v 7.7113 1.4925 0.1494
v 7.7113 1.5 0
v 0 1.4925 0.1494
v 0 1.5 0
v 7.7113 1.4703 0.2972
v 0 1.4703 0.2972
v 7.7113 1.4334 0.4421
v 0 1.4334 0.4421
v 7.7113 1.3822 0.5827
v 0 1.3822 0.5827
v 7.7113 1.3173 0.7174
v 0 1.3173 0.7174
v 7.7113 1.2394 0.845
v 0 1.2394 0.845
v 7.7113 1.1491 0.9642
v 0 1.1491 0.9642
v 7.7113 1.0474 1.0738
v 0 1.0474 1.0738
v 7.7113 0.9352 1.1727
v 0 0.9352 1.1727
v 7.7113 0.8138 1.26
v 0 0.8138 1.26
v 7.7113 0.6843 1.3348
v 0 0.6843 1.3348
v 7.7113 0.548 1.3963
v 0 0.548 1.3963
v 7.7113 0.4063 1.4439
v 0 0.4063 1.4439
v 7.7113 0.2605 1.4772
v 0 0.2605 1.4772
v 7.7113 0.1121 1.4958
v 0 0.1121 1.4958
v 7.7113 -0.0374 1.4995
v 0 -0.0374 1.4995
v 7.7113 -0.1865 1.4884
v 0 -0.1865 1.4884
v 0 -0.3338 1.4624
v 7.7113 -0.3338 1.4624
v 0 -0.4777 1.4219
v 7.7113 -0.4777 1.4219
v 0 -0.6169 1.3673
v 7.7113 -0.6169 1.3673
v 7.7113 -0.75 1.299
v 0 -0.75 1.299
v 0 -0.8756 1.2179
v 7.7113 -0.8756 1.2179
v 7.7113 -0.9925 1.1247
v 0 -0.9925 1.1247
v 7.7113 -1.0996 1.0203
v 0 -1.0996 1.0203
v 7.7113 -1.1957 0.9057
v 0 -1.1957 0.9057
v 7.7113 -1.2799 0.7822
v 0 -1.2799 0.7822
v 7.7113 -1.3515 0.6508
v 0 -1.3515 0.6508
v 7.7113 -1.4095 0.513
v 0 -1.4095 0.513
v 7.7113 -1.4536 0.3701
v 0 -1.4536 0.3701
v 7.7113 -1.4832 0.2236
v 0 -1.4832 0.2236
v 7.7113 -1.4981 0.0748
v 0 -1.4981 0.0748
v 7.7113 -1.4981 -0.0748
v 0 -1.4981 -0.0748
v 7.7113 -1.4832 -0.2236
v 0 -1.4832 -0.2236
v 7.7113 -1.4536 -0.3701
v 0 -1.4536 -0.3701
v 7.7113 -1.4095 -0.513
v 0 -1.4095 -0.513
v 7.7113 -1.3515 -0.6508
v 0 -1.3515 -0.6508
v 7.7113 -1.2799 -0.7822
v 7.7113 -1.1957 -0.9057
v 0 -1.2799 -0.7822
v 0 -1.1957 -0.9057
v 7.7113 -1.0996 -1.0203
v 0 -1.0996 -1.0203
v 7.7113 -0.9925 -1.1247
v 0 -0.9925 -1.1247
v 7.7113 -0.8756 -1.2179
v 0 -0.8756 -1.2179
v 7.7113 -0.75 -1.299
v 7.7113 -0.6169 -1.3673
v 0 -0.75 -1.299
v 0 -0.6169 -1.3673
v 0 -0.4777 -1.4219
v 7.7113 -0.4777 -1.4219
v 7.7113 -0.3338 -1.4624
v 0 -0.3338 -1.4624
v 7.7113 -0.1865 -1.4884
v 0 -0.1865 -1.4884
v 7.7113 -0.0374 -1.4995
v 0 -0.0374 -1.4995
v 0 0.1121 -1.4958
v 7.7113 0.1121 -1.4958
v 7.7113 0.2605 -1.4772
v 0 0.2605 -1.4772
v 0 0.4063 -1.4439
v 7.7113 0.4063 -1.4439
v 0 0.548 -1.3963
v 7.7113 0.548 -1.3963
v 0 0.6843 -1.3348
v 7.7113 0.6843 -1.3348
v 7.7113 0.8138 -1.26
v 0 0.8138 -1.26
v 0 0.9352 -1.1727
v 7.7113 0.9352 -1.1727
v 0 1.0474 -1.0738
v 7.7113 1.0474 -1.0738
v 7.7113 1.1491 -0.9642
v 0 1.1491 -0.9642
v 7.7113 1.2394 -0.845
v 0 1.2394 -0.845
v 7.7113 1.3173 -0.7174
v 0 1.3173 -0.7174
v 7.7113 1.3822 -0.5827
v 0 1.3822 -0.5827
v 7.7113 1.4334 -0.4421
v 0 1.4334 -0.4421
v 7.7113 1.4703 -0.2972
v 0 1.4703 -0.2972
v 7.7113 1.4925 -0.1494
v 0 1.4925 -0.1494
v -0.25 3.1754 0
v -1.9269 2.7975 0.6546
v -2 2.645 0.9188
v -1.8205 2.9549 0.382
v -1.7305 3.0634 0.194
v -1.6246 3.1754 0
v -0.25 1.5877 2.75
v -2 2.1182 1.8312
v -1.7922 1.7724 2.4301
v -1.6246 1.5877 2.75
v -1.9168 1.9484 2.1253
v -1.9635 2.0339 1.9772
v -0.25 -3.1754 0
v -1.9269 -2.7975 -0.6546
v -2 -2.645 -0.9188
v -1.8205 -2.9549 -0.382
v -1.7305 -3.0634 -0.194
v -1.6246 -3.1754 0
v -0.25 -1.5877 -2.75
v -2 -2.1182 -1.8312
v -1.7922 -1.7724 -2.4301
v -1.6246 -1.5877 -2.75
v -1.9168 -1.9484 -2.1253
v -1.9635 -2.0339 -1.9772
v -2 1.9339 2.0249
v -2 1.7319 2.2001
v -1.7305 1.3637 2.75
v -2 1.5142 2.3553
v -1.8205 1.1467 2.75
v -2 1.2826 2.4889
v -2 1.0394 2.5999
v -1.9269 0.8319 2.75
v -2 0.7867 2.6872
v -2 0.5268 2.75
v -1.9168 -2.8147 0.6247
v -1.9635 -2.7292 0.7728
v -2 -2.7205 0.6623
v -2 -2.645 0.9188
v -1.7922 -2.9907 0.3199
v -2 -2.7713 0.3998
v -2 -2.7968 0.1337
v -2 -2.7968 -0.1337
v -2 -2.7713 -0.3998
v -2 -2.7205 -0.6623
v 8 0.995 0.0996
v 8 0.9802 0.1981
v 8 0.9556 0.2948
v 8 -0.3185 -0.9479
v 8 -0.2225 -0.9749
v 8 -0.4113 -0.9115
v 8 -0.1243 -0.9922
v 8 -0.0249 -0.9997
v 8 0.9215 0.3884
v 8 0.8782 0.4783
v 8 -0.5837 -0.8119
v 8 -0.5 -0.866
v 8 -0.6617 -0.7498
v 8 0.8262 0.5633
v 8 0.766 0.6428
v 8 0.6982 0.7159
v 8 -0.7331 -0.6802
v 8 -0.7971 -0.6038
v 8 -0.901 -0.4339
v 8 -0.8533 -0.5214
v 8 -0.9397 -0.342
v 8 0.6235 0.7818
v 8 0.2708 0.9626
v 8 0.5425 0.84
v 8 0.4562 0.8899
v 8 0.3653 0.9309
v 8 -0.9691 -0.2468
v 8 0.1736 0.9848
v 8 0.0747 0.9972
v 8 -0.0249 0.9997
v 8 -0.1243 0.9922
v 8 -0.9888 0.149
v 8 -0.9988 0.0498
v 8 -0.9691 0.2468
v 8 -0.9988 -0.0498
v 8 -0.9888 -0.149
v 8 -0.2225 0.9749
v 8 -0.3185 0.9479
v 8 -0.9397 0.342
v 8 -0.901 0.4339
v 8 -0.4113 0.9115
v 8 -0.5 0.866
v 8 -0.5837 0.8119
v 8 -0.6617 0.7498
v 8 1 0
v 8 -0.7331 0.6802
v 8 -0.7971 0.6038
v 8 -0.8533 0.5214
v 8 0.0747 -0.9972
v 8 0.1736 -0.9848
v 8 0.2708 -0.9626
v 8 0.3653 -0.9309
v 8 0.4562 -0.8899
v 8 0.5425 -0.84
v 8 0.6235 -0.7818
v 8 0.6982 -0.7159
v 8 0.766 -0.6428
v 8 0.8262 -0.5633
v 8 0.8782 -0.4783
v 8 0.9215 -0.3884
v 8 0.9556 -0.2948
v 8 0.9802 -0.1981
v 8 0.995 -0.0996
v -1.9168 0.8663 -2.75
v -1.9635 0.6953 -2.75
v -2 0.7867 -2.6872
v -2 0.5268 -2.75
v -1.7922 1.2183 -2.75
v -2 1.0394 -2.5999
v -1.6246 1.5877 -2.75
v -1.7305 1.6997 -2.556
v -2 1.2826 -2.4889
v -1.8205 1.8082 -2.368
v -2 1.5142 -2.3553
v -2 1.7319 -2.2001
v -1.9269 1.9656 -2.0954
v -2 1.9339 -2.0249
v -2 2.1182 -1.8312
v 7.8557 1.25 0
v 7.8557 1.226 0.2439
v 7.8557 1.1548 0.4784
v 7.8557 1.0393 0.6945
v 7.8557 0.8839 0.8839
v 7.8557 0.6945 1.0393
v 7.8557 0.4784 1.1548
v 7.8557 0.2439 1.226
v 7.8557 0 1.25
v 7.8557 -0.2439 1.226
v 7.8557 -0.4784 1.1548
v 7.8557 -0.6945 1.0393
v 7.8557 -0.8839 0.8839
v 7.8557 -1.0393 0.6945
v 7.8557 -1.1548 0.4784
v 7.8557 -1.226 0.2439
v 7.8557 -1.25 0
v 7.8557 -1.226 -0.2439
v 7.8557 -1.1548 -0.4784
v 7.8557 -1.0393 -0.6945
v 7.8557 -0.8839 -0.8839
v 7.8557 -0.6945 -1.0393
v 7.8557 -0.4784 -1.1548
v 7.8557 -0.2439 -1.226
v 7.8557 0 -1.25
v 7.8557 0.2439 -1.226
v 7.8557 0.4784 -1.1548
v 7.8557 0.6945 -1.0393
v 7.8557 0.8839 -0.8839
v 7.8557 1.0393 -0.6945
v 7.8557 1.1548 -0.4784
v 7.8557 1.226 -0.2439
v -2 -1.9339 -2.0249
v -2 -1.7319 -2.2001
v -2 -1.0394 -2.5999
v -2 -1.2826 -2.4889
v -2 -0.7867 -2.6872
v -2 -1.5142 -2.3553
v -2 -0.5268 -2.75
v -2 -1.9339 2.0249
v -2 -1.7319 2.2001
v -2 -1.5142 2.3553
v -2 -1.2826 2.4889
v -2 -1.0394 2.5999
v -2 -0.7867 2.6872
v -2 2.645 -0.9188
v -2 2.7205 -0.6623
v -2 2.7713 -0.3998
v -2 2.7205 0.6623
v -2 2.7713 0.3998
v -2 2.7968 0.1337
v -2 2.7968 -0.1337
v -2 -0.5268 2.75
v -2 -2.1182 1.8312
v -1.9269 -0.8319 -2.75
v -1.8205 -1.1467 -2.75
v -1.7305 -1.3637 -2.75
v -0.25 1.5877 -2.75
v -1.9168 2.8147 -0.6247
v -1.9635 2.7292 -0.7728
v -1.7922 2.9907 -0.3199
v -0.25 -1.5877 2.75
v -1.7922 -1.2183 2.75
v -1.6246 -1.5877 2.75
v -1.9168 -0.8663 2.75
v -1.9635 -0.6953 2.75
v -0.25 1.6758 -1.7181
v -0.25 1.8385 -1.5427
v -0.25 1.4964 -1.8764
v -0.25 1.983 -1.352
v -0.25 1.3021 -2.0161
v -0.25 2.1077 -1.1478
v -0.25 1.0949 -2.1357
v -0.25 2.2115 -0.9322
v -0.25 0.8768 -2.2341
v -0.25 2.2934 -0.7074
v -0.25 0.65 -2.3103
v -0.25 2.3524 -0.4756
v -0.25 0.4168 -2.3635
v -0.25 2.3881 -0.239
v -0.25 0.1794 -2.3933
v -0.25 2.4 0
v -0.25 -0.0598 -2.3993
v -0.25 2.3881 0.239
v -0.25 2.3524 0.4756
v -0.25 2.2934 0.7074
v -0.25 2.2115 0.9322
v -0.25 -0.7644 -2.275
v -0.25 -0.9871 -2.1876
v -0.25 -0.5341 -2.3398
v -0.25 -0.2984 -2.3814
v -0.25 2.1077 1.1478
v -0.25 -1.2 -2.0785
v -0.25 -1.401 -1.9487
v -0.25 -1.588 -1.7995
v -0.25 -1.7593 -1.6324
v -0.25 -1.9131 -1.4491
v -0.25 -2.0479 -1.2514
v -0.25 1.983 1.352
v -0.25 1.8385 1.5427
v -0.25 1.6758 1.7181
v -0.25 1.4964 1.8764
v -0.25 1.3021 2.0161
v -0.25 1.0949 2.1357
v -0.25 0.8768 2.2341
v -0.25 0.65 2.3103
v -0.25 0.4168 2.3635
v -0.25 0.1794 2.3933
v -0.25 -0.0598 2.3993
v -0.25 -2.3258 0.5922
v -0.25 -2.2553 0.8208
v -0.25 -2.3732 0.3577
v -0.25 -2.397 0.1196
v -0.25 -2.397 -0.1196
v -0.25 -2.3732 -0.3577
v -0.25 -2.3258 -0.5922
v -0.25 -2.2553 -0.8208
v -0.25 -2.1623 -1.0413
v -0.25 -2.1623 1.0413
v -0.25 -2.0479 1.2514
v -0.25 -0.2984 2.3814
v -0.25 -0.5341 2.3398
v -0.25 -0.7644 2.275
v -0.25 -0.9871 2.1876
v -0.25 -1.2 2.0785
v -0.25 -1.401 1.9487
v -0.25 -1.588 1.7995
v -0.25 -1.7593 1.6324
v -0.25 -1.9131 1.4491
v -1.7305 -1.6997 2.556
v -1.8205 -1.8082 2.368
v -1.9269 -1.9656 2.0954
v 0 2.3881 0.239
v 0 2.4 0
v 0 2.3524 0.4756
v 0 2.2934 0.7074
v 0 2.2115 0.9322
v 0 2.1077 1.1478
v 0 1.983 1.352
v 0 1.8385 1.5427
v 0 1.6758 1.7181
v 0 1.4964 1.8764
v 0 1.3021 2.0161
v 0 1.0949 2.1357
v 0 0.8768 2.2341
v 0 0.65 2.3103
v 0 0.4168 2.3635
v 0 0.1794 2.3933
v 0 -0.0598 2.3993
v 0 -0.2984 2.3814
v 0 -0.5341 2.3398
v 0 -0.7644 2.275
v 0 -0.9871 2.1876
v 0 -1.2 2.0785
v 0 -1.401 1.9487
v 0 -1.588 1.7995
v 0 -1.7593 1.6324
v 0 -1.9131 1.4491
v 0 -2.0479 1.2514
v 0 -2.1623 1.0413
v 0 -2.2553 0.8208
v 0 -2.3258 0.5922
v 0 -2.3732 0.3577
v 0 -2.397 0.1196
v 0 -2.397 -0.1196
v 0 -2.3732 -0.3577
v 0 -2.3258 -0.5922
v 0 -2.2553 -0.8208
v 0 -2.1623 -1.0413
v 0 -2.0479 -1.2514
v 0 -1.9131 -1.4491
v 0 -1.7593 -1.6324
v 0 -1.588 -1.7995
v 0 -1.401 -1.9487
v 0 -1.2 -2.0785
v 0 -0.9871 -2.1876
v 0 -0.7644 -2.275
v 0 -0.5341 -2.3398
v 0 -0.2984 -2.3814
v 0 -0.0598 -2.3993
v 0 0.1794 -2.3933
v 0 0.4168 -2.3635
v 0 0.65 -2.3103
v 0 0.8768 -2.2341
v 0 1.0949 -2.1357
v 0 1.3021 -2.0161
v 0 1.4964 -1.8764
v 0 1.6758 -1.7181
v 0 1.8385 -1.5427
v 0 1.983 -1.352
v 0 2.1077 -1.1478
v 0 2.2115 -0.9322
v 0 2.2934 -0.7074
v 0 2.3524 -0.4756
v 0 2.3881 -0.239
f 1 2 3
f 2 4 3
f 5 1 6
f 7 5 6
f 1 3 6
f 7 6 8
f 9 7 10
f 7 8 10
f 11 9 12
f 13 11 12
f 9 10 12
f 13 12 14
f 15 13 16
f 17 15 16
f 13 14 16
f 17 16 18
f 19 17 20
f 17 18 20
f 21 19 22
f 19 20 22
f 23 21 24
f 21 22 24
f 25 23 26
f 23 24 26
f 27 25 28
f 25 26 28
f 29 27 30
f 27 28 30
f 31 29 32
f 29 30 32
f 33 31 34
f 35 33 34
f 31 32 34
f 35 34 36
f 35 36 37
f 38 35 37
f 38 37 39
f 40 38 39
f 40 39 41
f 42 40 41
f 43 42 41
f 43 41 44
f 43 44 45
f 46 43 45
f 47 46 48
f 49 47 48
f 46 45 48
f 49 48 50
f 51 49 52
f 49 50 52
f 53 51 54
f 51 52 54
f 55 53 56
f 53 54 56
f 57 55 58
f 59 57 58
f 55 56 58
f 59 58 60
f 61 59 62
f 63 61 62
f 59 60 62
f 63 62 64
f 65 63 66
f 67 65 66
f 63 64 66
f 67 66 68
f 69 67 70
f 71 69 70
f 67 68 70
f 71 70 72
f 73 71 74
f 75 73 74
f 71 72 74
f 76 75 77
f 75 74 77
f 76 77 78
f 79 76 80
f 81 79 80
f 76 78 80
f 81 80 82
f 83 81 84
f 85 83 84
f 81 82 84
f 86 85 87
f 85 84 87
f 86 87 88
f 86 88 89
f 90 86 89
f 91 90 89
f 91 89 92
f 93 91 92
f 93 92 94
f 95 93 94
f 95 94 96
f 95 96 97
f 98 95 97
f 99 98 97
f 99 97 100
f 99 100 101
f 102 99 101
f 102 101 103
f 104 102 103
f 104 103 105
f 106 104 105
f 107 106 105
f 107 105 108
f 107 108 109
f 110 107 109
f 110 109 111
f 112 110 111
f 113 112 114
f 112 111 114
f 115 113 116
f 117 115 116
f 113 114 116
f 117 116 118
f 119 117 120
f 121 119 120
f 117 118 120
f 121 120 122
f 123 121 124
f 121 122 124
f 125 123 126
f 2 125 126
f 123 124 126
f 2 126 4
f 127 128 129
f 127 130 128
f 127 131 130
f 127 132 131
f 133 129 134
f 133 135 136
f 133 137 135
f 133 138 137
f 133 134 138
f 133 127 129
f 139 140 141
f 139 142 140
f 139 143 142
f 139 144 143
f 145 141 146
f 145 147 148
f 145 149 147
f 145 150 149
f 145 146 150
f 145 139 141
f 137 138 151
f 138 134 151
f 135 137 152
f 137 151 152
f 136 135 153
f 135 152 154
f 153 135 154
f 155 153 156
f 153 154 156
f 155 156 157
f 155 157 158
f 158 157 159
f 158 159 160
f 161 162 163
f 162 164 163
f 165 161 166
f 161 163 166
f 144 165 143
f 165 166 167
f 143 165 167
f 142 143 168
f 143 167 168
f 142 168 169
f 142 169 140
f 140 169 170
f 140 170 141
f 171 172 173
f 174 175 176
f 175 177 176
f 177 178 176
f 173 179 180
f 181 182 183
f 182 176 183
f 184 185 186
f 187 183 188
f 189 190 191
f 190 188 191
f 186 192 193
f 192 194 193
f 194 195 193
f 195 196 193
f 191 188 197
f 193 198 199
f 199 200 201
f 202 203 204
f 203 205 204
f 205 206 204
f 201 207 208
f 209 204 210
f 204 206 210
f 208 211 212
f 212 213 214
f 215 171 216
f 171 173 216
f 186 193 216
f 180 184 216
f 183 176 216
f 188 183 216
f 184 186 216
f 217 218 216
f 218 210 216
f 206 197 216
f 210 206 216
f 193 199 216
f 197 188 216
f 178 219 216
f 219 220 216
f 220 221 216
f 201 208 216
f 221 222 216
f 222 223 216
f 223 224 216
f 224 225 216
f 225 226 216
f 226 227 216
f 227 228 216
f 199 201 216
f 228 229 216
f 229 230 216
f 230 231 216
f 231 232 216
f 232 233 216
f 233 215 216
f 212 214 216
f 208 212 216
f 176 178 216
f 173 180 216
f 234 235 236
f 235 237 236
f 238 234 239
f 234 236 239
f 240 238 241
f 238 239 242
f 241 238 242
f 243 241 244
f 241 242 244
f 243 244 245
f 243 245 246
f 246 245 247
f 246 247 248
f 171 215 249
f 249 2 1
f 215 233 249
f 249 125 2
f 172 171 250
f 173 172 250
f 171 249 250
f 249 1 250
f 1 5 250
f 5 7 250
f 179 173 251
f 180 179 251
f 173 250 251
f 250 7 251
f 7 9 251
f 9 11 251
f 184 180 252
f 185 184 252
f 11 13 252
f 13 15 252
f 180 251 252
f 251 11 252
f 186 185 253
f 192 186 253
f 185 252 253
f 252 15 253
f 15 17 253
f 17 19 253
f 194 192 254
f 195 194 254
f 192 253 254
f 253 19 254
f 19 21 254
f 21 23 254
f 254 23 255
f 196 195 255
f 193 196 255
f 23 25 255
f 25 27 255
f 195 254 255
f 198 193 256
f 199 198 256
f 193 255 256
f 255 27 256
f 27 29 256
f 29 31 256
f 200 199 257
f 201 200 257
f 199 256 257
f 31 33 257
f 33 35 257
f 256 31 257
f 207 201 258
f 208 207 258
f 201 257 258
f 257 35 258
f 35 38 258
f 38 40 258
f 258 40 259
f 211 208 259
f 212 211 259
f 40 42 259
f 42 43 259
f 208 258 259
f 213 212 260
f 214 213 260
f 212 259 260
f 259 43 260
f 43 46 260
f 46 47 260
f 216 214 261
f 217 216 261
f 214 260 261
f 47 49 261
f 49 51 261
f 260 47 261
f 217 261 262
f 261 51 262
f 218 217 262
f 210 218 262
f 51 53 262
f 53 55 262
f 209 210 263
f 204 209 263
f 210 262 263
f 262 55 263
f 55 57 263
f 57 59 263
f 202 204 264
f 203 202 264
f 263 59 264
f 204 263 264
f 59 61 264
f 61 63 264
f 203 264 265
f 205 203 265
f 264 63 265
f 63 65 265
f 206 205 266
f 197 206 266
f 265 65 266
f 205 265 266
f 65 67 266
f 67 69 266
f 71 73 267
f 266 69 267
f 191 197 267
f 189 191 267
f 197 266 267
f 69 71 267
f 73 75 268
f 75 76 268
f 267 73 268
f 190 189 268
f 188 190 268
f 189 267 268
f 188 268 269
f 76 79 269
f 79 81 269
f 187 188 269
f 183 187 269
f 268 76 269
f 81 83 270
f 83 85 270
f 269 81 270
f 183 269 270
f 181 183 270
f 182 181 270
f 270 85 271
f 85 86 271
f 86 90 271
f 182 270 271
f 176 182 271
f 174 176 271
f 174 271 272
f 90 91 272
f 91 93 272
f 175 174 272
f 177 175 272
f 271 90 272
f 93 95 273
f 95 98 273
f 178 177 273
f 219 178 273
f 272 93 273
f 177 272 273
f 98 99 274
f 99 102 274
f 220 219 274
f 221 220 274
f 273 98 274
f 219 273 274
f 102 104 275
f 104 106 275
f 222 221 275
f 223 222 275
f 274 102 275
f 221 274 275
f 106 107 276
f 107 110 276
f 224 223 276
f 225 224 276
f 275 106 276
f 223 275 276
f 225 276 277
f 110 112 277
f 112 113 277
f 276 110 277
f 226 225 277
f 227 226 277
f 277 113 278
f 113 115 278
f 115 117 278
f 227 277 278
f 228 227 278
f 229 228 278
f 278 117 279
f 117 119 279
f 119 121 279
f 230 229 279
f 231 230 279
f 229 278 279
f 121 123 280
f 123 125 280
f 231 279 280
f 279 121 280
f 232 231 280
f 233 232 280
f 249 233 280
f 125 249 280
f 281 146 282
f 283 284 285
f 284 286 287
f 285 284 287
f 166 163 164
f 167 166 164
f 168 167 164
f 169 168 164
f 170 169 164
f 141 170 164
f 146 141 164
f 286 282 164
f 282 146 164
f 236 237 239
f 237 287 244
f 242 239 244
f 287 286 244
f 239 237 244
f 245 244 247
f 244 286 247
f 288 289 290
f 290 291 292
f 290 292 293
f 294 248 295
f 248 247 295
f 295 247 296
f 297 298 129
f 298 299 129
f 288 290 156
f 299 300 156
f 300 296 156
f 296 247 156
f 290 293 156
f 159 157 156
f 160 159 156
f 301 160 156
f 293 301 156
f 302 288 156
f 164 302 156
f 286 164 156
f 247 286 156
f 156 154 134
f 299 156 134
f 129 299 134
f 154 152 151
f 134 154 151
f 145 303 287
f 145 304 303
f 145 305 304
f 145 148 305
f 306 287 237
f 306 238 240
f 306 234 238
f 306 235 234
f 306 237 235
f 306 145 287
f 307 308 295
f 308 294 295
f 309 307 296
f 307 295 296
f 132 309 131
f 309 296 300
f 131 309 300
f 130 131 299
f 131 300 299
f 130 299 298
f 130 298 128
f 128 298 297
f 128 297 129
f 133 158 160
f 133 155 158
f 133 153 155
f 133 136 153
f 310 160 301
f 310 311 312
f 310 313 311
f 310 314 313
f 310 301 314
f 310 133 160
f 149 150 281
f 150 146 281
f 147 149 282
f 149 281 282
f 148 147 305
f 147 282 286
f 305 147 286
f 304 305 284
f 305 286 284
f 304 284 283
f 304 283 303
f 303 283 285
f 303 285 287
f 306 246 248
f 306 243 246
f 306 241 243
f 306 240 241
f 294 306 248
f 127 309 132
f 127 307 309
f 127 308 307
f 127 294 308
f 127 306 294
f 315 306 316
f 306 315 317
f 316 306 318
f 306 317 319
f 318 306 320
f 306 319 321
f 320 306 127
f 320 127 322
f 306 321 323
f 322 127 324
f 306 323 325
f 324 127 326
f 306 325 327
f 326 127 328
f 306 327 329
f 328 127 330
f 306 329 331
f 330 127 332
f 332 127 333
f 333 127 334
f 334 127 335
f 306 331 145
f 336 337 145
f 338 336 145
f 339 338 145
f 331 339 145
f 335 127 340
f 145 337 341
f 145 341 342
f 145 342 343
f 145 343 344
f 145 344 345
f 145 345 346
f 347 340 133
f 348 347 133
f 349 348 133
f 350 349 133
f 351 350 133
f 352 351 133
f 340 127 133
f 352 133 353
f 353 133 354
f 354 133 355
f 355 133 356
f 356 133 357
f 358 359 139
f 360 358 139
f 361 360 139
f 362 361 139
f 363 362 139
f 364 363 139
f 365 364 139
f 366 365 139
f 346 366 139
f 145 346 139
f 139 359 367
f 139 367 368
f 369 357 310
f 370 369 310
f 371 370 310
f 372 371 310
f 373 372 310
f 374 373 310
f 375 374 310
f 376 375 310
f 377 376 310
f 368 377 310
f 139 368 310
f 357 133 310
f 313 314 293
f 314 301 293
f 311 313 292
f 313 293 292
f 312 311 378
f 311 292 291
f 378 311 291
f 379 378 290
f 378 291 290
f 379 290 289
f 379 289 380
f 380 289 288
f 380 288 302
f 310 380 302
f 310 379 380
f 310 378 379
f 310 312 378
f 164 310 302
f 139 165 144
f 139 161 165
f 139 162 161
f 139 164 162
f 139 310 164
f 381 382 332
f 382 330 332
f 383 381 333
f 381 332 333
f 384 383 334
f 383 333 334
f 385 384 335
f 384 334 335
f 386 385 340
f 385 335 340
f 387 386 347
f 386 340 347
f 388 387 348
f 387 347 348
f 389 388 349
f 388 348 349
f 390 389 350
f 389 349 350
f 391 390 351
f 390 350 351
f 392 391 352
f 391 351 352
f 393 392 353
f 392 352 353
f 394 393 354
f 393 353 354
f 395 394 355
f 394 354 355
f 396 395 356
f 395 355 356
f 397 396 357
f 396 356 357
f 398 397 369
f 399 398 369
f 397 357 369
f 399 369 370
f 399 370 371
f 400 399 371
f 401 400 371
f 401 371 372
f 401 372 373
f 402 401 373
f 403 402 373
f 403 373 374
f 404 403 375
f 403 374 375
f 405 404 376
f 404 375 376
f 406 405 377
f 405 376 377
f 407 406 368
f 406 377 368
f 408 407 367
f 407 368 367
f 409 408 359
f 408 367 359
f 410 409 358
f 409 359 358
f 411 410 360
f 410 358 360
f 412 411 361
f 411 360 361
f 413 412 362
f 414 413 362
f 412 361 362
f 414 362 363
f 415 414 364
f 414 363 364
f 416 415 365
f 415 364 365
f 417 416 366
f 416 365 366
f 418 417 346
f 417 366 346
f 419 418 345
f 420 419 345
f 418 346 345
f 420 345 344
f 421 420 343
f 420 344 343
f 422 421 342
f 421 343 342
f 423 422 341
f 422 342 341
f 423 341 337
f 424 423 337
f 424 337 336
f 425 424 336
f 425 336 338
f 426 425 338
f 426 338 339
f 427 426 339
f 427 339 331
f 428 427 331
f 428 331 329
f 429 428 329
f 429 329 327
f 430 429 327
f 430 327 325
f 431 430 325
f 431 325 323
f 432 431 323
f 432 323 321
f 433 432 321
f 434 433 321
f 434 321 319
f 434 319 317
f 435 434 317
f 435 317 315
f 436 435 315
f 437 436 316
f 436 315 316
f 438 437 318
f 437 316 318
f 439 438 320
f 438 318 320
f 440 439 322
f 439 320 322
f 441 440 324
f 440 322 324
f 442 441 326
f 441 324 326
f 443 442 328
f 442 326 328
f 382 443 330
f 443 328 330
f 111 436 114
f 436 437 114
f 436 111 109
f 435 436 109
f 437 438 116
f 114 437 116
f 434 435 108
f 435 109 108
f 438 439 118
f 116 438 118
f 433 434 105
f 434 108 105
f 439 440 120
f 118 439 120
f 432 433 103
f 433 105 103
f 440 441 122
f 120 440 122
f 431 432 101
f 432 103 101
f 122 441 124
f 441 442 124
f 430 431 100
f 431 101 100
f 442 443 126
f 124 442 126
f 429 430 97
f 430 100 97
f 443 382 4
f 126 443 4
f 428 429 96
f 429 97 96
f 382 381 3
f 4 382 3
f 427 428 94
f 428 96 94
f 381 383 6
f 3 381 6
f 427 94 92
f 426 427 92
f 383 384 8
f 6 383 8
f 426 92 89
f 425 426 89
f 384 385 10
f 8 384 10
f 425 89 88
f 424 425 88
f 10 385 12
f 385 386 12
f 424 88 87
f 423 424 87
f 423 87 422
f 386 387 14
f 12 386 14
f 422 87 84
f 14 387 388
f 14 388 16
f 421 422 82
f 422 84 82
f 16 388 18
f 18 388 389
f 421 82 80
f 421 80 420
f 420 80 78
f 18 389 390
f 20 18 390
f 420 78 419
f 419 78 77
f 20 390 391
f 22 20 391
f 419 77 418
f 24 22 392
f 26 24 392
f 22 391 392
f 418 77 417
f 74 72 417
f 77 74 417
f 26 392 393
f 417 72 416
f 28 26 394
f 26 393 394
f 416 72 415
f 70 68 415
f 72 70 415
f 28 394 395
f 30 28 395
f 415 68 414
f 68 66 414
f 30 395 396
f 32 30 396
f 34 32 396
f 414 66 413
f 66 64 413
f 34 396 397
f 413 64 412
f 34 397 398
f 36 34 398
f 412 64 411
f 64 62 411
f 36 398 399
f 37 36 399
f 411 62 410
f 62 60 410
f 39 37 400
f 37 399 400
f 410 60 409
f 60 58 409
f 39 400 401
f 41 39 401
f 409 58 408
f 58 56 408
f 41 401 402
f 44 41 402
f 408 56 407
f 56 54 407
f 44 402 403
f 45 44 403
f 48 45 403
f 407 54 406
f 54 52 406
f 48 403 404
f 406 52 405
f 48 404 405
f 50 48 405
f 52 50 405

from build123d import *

# Parameters (mm, degrees)
SKETCH2_OUTSIDE_W  = 11.336
SKETCH2_OUTSIDE_H  = 11.336
CUT_EXTRUDE1_DEPTH = 10


with BuildPart() as part:
    # Sketch1 → Revolve1 (revolve)
    with BuildSketch(Plane.XY):
        Polygon((0, 1.5), (0, 2.4), (-0.25, 2.4), (-0.25, 3.3), (-1.5, 3.3), (-2, 2.8), (-2, 0), (8, 0), (8, 1), (7.711324865, 1.5), align=None)
    revolve(axis=Axis((-88.99, 0, 0), (1, 0, 0)))

    # Sketch2 outside → Cut-Extrude1 (cut)
    with BuildSketch(Plane(origin=(0, 0, 0), x_dir=(0, 0, -1), z_dir=(1, 0, 0))):
        Rectangle(SKETCH2_OUTSIDE_W, SKETCH2_OUTSIDE_H)
        Polygon((0, 3.175426481), (-2.75, 1.58771324), (-2.75, -1.58771324), (0, -3.175426481), (2.75, -1.58771324), (2.75, 1.58771324), align=None, mode=Mode.SUBTRACT)
    extrude(amount=-CUT_EXTRUDE1_DEPTH, mode=Mode.SUBTRACT)


solid = part.part
